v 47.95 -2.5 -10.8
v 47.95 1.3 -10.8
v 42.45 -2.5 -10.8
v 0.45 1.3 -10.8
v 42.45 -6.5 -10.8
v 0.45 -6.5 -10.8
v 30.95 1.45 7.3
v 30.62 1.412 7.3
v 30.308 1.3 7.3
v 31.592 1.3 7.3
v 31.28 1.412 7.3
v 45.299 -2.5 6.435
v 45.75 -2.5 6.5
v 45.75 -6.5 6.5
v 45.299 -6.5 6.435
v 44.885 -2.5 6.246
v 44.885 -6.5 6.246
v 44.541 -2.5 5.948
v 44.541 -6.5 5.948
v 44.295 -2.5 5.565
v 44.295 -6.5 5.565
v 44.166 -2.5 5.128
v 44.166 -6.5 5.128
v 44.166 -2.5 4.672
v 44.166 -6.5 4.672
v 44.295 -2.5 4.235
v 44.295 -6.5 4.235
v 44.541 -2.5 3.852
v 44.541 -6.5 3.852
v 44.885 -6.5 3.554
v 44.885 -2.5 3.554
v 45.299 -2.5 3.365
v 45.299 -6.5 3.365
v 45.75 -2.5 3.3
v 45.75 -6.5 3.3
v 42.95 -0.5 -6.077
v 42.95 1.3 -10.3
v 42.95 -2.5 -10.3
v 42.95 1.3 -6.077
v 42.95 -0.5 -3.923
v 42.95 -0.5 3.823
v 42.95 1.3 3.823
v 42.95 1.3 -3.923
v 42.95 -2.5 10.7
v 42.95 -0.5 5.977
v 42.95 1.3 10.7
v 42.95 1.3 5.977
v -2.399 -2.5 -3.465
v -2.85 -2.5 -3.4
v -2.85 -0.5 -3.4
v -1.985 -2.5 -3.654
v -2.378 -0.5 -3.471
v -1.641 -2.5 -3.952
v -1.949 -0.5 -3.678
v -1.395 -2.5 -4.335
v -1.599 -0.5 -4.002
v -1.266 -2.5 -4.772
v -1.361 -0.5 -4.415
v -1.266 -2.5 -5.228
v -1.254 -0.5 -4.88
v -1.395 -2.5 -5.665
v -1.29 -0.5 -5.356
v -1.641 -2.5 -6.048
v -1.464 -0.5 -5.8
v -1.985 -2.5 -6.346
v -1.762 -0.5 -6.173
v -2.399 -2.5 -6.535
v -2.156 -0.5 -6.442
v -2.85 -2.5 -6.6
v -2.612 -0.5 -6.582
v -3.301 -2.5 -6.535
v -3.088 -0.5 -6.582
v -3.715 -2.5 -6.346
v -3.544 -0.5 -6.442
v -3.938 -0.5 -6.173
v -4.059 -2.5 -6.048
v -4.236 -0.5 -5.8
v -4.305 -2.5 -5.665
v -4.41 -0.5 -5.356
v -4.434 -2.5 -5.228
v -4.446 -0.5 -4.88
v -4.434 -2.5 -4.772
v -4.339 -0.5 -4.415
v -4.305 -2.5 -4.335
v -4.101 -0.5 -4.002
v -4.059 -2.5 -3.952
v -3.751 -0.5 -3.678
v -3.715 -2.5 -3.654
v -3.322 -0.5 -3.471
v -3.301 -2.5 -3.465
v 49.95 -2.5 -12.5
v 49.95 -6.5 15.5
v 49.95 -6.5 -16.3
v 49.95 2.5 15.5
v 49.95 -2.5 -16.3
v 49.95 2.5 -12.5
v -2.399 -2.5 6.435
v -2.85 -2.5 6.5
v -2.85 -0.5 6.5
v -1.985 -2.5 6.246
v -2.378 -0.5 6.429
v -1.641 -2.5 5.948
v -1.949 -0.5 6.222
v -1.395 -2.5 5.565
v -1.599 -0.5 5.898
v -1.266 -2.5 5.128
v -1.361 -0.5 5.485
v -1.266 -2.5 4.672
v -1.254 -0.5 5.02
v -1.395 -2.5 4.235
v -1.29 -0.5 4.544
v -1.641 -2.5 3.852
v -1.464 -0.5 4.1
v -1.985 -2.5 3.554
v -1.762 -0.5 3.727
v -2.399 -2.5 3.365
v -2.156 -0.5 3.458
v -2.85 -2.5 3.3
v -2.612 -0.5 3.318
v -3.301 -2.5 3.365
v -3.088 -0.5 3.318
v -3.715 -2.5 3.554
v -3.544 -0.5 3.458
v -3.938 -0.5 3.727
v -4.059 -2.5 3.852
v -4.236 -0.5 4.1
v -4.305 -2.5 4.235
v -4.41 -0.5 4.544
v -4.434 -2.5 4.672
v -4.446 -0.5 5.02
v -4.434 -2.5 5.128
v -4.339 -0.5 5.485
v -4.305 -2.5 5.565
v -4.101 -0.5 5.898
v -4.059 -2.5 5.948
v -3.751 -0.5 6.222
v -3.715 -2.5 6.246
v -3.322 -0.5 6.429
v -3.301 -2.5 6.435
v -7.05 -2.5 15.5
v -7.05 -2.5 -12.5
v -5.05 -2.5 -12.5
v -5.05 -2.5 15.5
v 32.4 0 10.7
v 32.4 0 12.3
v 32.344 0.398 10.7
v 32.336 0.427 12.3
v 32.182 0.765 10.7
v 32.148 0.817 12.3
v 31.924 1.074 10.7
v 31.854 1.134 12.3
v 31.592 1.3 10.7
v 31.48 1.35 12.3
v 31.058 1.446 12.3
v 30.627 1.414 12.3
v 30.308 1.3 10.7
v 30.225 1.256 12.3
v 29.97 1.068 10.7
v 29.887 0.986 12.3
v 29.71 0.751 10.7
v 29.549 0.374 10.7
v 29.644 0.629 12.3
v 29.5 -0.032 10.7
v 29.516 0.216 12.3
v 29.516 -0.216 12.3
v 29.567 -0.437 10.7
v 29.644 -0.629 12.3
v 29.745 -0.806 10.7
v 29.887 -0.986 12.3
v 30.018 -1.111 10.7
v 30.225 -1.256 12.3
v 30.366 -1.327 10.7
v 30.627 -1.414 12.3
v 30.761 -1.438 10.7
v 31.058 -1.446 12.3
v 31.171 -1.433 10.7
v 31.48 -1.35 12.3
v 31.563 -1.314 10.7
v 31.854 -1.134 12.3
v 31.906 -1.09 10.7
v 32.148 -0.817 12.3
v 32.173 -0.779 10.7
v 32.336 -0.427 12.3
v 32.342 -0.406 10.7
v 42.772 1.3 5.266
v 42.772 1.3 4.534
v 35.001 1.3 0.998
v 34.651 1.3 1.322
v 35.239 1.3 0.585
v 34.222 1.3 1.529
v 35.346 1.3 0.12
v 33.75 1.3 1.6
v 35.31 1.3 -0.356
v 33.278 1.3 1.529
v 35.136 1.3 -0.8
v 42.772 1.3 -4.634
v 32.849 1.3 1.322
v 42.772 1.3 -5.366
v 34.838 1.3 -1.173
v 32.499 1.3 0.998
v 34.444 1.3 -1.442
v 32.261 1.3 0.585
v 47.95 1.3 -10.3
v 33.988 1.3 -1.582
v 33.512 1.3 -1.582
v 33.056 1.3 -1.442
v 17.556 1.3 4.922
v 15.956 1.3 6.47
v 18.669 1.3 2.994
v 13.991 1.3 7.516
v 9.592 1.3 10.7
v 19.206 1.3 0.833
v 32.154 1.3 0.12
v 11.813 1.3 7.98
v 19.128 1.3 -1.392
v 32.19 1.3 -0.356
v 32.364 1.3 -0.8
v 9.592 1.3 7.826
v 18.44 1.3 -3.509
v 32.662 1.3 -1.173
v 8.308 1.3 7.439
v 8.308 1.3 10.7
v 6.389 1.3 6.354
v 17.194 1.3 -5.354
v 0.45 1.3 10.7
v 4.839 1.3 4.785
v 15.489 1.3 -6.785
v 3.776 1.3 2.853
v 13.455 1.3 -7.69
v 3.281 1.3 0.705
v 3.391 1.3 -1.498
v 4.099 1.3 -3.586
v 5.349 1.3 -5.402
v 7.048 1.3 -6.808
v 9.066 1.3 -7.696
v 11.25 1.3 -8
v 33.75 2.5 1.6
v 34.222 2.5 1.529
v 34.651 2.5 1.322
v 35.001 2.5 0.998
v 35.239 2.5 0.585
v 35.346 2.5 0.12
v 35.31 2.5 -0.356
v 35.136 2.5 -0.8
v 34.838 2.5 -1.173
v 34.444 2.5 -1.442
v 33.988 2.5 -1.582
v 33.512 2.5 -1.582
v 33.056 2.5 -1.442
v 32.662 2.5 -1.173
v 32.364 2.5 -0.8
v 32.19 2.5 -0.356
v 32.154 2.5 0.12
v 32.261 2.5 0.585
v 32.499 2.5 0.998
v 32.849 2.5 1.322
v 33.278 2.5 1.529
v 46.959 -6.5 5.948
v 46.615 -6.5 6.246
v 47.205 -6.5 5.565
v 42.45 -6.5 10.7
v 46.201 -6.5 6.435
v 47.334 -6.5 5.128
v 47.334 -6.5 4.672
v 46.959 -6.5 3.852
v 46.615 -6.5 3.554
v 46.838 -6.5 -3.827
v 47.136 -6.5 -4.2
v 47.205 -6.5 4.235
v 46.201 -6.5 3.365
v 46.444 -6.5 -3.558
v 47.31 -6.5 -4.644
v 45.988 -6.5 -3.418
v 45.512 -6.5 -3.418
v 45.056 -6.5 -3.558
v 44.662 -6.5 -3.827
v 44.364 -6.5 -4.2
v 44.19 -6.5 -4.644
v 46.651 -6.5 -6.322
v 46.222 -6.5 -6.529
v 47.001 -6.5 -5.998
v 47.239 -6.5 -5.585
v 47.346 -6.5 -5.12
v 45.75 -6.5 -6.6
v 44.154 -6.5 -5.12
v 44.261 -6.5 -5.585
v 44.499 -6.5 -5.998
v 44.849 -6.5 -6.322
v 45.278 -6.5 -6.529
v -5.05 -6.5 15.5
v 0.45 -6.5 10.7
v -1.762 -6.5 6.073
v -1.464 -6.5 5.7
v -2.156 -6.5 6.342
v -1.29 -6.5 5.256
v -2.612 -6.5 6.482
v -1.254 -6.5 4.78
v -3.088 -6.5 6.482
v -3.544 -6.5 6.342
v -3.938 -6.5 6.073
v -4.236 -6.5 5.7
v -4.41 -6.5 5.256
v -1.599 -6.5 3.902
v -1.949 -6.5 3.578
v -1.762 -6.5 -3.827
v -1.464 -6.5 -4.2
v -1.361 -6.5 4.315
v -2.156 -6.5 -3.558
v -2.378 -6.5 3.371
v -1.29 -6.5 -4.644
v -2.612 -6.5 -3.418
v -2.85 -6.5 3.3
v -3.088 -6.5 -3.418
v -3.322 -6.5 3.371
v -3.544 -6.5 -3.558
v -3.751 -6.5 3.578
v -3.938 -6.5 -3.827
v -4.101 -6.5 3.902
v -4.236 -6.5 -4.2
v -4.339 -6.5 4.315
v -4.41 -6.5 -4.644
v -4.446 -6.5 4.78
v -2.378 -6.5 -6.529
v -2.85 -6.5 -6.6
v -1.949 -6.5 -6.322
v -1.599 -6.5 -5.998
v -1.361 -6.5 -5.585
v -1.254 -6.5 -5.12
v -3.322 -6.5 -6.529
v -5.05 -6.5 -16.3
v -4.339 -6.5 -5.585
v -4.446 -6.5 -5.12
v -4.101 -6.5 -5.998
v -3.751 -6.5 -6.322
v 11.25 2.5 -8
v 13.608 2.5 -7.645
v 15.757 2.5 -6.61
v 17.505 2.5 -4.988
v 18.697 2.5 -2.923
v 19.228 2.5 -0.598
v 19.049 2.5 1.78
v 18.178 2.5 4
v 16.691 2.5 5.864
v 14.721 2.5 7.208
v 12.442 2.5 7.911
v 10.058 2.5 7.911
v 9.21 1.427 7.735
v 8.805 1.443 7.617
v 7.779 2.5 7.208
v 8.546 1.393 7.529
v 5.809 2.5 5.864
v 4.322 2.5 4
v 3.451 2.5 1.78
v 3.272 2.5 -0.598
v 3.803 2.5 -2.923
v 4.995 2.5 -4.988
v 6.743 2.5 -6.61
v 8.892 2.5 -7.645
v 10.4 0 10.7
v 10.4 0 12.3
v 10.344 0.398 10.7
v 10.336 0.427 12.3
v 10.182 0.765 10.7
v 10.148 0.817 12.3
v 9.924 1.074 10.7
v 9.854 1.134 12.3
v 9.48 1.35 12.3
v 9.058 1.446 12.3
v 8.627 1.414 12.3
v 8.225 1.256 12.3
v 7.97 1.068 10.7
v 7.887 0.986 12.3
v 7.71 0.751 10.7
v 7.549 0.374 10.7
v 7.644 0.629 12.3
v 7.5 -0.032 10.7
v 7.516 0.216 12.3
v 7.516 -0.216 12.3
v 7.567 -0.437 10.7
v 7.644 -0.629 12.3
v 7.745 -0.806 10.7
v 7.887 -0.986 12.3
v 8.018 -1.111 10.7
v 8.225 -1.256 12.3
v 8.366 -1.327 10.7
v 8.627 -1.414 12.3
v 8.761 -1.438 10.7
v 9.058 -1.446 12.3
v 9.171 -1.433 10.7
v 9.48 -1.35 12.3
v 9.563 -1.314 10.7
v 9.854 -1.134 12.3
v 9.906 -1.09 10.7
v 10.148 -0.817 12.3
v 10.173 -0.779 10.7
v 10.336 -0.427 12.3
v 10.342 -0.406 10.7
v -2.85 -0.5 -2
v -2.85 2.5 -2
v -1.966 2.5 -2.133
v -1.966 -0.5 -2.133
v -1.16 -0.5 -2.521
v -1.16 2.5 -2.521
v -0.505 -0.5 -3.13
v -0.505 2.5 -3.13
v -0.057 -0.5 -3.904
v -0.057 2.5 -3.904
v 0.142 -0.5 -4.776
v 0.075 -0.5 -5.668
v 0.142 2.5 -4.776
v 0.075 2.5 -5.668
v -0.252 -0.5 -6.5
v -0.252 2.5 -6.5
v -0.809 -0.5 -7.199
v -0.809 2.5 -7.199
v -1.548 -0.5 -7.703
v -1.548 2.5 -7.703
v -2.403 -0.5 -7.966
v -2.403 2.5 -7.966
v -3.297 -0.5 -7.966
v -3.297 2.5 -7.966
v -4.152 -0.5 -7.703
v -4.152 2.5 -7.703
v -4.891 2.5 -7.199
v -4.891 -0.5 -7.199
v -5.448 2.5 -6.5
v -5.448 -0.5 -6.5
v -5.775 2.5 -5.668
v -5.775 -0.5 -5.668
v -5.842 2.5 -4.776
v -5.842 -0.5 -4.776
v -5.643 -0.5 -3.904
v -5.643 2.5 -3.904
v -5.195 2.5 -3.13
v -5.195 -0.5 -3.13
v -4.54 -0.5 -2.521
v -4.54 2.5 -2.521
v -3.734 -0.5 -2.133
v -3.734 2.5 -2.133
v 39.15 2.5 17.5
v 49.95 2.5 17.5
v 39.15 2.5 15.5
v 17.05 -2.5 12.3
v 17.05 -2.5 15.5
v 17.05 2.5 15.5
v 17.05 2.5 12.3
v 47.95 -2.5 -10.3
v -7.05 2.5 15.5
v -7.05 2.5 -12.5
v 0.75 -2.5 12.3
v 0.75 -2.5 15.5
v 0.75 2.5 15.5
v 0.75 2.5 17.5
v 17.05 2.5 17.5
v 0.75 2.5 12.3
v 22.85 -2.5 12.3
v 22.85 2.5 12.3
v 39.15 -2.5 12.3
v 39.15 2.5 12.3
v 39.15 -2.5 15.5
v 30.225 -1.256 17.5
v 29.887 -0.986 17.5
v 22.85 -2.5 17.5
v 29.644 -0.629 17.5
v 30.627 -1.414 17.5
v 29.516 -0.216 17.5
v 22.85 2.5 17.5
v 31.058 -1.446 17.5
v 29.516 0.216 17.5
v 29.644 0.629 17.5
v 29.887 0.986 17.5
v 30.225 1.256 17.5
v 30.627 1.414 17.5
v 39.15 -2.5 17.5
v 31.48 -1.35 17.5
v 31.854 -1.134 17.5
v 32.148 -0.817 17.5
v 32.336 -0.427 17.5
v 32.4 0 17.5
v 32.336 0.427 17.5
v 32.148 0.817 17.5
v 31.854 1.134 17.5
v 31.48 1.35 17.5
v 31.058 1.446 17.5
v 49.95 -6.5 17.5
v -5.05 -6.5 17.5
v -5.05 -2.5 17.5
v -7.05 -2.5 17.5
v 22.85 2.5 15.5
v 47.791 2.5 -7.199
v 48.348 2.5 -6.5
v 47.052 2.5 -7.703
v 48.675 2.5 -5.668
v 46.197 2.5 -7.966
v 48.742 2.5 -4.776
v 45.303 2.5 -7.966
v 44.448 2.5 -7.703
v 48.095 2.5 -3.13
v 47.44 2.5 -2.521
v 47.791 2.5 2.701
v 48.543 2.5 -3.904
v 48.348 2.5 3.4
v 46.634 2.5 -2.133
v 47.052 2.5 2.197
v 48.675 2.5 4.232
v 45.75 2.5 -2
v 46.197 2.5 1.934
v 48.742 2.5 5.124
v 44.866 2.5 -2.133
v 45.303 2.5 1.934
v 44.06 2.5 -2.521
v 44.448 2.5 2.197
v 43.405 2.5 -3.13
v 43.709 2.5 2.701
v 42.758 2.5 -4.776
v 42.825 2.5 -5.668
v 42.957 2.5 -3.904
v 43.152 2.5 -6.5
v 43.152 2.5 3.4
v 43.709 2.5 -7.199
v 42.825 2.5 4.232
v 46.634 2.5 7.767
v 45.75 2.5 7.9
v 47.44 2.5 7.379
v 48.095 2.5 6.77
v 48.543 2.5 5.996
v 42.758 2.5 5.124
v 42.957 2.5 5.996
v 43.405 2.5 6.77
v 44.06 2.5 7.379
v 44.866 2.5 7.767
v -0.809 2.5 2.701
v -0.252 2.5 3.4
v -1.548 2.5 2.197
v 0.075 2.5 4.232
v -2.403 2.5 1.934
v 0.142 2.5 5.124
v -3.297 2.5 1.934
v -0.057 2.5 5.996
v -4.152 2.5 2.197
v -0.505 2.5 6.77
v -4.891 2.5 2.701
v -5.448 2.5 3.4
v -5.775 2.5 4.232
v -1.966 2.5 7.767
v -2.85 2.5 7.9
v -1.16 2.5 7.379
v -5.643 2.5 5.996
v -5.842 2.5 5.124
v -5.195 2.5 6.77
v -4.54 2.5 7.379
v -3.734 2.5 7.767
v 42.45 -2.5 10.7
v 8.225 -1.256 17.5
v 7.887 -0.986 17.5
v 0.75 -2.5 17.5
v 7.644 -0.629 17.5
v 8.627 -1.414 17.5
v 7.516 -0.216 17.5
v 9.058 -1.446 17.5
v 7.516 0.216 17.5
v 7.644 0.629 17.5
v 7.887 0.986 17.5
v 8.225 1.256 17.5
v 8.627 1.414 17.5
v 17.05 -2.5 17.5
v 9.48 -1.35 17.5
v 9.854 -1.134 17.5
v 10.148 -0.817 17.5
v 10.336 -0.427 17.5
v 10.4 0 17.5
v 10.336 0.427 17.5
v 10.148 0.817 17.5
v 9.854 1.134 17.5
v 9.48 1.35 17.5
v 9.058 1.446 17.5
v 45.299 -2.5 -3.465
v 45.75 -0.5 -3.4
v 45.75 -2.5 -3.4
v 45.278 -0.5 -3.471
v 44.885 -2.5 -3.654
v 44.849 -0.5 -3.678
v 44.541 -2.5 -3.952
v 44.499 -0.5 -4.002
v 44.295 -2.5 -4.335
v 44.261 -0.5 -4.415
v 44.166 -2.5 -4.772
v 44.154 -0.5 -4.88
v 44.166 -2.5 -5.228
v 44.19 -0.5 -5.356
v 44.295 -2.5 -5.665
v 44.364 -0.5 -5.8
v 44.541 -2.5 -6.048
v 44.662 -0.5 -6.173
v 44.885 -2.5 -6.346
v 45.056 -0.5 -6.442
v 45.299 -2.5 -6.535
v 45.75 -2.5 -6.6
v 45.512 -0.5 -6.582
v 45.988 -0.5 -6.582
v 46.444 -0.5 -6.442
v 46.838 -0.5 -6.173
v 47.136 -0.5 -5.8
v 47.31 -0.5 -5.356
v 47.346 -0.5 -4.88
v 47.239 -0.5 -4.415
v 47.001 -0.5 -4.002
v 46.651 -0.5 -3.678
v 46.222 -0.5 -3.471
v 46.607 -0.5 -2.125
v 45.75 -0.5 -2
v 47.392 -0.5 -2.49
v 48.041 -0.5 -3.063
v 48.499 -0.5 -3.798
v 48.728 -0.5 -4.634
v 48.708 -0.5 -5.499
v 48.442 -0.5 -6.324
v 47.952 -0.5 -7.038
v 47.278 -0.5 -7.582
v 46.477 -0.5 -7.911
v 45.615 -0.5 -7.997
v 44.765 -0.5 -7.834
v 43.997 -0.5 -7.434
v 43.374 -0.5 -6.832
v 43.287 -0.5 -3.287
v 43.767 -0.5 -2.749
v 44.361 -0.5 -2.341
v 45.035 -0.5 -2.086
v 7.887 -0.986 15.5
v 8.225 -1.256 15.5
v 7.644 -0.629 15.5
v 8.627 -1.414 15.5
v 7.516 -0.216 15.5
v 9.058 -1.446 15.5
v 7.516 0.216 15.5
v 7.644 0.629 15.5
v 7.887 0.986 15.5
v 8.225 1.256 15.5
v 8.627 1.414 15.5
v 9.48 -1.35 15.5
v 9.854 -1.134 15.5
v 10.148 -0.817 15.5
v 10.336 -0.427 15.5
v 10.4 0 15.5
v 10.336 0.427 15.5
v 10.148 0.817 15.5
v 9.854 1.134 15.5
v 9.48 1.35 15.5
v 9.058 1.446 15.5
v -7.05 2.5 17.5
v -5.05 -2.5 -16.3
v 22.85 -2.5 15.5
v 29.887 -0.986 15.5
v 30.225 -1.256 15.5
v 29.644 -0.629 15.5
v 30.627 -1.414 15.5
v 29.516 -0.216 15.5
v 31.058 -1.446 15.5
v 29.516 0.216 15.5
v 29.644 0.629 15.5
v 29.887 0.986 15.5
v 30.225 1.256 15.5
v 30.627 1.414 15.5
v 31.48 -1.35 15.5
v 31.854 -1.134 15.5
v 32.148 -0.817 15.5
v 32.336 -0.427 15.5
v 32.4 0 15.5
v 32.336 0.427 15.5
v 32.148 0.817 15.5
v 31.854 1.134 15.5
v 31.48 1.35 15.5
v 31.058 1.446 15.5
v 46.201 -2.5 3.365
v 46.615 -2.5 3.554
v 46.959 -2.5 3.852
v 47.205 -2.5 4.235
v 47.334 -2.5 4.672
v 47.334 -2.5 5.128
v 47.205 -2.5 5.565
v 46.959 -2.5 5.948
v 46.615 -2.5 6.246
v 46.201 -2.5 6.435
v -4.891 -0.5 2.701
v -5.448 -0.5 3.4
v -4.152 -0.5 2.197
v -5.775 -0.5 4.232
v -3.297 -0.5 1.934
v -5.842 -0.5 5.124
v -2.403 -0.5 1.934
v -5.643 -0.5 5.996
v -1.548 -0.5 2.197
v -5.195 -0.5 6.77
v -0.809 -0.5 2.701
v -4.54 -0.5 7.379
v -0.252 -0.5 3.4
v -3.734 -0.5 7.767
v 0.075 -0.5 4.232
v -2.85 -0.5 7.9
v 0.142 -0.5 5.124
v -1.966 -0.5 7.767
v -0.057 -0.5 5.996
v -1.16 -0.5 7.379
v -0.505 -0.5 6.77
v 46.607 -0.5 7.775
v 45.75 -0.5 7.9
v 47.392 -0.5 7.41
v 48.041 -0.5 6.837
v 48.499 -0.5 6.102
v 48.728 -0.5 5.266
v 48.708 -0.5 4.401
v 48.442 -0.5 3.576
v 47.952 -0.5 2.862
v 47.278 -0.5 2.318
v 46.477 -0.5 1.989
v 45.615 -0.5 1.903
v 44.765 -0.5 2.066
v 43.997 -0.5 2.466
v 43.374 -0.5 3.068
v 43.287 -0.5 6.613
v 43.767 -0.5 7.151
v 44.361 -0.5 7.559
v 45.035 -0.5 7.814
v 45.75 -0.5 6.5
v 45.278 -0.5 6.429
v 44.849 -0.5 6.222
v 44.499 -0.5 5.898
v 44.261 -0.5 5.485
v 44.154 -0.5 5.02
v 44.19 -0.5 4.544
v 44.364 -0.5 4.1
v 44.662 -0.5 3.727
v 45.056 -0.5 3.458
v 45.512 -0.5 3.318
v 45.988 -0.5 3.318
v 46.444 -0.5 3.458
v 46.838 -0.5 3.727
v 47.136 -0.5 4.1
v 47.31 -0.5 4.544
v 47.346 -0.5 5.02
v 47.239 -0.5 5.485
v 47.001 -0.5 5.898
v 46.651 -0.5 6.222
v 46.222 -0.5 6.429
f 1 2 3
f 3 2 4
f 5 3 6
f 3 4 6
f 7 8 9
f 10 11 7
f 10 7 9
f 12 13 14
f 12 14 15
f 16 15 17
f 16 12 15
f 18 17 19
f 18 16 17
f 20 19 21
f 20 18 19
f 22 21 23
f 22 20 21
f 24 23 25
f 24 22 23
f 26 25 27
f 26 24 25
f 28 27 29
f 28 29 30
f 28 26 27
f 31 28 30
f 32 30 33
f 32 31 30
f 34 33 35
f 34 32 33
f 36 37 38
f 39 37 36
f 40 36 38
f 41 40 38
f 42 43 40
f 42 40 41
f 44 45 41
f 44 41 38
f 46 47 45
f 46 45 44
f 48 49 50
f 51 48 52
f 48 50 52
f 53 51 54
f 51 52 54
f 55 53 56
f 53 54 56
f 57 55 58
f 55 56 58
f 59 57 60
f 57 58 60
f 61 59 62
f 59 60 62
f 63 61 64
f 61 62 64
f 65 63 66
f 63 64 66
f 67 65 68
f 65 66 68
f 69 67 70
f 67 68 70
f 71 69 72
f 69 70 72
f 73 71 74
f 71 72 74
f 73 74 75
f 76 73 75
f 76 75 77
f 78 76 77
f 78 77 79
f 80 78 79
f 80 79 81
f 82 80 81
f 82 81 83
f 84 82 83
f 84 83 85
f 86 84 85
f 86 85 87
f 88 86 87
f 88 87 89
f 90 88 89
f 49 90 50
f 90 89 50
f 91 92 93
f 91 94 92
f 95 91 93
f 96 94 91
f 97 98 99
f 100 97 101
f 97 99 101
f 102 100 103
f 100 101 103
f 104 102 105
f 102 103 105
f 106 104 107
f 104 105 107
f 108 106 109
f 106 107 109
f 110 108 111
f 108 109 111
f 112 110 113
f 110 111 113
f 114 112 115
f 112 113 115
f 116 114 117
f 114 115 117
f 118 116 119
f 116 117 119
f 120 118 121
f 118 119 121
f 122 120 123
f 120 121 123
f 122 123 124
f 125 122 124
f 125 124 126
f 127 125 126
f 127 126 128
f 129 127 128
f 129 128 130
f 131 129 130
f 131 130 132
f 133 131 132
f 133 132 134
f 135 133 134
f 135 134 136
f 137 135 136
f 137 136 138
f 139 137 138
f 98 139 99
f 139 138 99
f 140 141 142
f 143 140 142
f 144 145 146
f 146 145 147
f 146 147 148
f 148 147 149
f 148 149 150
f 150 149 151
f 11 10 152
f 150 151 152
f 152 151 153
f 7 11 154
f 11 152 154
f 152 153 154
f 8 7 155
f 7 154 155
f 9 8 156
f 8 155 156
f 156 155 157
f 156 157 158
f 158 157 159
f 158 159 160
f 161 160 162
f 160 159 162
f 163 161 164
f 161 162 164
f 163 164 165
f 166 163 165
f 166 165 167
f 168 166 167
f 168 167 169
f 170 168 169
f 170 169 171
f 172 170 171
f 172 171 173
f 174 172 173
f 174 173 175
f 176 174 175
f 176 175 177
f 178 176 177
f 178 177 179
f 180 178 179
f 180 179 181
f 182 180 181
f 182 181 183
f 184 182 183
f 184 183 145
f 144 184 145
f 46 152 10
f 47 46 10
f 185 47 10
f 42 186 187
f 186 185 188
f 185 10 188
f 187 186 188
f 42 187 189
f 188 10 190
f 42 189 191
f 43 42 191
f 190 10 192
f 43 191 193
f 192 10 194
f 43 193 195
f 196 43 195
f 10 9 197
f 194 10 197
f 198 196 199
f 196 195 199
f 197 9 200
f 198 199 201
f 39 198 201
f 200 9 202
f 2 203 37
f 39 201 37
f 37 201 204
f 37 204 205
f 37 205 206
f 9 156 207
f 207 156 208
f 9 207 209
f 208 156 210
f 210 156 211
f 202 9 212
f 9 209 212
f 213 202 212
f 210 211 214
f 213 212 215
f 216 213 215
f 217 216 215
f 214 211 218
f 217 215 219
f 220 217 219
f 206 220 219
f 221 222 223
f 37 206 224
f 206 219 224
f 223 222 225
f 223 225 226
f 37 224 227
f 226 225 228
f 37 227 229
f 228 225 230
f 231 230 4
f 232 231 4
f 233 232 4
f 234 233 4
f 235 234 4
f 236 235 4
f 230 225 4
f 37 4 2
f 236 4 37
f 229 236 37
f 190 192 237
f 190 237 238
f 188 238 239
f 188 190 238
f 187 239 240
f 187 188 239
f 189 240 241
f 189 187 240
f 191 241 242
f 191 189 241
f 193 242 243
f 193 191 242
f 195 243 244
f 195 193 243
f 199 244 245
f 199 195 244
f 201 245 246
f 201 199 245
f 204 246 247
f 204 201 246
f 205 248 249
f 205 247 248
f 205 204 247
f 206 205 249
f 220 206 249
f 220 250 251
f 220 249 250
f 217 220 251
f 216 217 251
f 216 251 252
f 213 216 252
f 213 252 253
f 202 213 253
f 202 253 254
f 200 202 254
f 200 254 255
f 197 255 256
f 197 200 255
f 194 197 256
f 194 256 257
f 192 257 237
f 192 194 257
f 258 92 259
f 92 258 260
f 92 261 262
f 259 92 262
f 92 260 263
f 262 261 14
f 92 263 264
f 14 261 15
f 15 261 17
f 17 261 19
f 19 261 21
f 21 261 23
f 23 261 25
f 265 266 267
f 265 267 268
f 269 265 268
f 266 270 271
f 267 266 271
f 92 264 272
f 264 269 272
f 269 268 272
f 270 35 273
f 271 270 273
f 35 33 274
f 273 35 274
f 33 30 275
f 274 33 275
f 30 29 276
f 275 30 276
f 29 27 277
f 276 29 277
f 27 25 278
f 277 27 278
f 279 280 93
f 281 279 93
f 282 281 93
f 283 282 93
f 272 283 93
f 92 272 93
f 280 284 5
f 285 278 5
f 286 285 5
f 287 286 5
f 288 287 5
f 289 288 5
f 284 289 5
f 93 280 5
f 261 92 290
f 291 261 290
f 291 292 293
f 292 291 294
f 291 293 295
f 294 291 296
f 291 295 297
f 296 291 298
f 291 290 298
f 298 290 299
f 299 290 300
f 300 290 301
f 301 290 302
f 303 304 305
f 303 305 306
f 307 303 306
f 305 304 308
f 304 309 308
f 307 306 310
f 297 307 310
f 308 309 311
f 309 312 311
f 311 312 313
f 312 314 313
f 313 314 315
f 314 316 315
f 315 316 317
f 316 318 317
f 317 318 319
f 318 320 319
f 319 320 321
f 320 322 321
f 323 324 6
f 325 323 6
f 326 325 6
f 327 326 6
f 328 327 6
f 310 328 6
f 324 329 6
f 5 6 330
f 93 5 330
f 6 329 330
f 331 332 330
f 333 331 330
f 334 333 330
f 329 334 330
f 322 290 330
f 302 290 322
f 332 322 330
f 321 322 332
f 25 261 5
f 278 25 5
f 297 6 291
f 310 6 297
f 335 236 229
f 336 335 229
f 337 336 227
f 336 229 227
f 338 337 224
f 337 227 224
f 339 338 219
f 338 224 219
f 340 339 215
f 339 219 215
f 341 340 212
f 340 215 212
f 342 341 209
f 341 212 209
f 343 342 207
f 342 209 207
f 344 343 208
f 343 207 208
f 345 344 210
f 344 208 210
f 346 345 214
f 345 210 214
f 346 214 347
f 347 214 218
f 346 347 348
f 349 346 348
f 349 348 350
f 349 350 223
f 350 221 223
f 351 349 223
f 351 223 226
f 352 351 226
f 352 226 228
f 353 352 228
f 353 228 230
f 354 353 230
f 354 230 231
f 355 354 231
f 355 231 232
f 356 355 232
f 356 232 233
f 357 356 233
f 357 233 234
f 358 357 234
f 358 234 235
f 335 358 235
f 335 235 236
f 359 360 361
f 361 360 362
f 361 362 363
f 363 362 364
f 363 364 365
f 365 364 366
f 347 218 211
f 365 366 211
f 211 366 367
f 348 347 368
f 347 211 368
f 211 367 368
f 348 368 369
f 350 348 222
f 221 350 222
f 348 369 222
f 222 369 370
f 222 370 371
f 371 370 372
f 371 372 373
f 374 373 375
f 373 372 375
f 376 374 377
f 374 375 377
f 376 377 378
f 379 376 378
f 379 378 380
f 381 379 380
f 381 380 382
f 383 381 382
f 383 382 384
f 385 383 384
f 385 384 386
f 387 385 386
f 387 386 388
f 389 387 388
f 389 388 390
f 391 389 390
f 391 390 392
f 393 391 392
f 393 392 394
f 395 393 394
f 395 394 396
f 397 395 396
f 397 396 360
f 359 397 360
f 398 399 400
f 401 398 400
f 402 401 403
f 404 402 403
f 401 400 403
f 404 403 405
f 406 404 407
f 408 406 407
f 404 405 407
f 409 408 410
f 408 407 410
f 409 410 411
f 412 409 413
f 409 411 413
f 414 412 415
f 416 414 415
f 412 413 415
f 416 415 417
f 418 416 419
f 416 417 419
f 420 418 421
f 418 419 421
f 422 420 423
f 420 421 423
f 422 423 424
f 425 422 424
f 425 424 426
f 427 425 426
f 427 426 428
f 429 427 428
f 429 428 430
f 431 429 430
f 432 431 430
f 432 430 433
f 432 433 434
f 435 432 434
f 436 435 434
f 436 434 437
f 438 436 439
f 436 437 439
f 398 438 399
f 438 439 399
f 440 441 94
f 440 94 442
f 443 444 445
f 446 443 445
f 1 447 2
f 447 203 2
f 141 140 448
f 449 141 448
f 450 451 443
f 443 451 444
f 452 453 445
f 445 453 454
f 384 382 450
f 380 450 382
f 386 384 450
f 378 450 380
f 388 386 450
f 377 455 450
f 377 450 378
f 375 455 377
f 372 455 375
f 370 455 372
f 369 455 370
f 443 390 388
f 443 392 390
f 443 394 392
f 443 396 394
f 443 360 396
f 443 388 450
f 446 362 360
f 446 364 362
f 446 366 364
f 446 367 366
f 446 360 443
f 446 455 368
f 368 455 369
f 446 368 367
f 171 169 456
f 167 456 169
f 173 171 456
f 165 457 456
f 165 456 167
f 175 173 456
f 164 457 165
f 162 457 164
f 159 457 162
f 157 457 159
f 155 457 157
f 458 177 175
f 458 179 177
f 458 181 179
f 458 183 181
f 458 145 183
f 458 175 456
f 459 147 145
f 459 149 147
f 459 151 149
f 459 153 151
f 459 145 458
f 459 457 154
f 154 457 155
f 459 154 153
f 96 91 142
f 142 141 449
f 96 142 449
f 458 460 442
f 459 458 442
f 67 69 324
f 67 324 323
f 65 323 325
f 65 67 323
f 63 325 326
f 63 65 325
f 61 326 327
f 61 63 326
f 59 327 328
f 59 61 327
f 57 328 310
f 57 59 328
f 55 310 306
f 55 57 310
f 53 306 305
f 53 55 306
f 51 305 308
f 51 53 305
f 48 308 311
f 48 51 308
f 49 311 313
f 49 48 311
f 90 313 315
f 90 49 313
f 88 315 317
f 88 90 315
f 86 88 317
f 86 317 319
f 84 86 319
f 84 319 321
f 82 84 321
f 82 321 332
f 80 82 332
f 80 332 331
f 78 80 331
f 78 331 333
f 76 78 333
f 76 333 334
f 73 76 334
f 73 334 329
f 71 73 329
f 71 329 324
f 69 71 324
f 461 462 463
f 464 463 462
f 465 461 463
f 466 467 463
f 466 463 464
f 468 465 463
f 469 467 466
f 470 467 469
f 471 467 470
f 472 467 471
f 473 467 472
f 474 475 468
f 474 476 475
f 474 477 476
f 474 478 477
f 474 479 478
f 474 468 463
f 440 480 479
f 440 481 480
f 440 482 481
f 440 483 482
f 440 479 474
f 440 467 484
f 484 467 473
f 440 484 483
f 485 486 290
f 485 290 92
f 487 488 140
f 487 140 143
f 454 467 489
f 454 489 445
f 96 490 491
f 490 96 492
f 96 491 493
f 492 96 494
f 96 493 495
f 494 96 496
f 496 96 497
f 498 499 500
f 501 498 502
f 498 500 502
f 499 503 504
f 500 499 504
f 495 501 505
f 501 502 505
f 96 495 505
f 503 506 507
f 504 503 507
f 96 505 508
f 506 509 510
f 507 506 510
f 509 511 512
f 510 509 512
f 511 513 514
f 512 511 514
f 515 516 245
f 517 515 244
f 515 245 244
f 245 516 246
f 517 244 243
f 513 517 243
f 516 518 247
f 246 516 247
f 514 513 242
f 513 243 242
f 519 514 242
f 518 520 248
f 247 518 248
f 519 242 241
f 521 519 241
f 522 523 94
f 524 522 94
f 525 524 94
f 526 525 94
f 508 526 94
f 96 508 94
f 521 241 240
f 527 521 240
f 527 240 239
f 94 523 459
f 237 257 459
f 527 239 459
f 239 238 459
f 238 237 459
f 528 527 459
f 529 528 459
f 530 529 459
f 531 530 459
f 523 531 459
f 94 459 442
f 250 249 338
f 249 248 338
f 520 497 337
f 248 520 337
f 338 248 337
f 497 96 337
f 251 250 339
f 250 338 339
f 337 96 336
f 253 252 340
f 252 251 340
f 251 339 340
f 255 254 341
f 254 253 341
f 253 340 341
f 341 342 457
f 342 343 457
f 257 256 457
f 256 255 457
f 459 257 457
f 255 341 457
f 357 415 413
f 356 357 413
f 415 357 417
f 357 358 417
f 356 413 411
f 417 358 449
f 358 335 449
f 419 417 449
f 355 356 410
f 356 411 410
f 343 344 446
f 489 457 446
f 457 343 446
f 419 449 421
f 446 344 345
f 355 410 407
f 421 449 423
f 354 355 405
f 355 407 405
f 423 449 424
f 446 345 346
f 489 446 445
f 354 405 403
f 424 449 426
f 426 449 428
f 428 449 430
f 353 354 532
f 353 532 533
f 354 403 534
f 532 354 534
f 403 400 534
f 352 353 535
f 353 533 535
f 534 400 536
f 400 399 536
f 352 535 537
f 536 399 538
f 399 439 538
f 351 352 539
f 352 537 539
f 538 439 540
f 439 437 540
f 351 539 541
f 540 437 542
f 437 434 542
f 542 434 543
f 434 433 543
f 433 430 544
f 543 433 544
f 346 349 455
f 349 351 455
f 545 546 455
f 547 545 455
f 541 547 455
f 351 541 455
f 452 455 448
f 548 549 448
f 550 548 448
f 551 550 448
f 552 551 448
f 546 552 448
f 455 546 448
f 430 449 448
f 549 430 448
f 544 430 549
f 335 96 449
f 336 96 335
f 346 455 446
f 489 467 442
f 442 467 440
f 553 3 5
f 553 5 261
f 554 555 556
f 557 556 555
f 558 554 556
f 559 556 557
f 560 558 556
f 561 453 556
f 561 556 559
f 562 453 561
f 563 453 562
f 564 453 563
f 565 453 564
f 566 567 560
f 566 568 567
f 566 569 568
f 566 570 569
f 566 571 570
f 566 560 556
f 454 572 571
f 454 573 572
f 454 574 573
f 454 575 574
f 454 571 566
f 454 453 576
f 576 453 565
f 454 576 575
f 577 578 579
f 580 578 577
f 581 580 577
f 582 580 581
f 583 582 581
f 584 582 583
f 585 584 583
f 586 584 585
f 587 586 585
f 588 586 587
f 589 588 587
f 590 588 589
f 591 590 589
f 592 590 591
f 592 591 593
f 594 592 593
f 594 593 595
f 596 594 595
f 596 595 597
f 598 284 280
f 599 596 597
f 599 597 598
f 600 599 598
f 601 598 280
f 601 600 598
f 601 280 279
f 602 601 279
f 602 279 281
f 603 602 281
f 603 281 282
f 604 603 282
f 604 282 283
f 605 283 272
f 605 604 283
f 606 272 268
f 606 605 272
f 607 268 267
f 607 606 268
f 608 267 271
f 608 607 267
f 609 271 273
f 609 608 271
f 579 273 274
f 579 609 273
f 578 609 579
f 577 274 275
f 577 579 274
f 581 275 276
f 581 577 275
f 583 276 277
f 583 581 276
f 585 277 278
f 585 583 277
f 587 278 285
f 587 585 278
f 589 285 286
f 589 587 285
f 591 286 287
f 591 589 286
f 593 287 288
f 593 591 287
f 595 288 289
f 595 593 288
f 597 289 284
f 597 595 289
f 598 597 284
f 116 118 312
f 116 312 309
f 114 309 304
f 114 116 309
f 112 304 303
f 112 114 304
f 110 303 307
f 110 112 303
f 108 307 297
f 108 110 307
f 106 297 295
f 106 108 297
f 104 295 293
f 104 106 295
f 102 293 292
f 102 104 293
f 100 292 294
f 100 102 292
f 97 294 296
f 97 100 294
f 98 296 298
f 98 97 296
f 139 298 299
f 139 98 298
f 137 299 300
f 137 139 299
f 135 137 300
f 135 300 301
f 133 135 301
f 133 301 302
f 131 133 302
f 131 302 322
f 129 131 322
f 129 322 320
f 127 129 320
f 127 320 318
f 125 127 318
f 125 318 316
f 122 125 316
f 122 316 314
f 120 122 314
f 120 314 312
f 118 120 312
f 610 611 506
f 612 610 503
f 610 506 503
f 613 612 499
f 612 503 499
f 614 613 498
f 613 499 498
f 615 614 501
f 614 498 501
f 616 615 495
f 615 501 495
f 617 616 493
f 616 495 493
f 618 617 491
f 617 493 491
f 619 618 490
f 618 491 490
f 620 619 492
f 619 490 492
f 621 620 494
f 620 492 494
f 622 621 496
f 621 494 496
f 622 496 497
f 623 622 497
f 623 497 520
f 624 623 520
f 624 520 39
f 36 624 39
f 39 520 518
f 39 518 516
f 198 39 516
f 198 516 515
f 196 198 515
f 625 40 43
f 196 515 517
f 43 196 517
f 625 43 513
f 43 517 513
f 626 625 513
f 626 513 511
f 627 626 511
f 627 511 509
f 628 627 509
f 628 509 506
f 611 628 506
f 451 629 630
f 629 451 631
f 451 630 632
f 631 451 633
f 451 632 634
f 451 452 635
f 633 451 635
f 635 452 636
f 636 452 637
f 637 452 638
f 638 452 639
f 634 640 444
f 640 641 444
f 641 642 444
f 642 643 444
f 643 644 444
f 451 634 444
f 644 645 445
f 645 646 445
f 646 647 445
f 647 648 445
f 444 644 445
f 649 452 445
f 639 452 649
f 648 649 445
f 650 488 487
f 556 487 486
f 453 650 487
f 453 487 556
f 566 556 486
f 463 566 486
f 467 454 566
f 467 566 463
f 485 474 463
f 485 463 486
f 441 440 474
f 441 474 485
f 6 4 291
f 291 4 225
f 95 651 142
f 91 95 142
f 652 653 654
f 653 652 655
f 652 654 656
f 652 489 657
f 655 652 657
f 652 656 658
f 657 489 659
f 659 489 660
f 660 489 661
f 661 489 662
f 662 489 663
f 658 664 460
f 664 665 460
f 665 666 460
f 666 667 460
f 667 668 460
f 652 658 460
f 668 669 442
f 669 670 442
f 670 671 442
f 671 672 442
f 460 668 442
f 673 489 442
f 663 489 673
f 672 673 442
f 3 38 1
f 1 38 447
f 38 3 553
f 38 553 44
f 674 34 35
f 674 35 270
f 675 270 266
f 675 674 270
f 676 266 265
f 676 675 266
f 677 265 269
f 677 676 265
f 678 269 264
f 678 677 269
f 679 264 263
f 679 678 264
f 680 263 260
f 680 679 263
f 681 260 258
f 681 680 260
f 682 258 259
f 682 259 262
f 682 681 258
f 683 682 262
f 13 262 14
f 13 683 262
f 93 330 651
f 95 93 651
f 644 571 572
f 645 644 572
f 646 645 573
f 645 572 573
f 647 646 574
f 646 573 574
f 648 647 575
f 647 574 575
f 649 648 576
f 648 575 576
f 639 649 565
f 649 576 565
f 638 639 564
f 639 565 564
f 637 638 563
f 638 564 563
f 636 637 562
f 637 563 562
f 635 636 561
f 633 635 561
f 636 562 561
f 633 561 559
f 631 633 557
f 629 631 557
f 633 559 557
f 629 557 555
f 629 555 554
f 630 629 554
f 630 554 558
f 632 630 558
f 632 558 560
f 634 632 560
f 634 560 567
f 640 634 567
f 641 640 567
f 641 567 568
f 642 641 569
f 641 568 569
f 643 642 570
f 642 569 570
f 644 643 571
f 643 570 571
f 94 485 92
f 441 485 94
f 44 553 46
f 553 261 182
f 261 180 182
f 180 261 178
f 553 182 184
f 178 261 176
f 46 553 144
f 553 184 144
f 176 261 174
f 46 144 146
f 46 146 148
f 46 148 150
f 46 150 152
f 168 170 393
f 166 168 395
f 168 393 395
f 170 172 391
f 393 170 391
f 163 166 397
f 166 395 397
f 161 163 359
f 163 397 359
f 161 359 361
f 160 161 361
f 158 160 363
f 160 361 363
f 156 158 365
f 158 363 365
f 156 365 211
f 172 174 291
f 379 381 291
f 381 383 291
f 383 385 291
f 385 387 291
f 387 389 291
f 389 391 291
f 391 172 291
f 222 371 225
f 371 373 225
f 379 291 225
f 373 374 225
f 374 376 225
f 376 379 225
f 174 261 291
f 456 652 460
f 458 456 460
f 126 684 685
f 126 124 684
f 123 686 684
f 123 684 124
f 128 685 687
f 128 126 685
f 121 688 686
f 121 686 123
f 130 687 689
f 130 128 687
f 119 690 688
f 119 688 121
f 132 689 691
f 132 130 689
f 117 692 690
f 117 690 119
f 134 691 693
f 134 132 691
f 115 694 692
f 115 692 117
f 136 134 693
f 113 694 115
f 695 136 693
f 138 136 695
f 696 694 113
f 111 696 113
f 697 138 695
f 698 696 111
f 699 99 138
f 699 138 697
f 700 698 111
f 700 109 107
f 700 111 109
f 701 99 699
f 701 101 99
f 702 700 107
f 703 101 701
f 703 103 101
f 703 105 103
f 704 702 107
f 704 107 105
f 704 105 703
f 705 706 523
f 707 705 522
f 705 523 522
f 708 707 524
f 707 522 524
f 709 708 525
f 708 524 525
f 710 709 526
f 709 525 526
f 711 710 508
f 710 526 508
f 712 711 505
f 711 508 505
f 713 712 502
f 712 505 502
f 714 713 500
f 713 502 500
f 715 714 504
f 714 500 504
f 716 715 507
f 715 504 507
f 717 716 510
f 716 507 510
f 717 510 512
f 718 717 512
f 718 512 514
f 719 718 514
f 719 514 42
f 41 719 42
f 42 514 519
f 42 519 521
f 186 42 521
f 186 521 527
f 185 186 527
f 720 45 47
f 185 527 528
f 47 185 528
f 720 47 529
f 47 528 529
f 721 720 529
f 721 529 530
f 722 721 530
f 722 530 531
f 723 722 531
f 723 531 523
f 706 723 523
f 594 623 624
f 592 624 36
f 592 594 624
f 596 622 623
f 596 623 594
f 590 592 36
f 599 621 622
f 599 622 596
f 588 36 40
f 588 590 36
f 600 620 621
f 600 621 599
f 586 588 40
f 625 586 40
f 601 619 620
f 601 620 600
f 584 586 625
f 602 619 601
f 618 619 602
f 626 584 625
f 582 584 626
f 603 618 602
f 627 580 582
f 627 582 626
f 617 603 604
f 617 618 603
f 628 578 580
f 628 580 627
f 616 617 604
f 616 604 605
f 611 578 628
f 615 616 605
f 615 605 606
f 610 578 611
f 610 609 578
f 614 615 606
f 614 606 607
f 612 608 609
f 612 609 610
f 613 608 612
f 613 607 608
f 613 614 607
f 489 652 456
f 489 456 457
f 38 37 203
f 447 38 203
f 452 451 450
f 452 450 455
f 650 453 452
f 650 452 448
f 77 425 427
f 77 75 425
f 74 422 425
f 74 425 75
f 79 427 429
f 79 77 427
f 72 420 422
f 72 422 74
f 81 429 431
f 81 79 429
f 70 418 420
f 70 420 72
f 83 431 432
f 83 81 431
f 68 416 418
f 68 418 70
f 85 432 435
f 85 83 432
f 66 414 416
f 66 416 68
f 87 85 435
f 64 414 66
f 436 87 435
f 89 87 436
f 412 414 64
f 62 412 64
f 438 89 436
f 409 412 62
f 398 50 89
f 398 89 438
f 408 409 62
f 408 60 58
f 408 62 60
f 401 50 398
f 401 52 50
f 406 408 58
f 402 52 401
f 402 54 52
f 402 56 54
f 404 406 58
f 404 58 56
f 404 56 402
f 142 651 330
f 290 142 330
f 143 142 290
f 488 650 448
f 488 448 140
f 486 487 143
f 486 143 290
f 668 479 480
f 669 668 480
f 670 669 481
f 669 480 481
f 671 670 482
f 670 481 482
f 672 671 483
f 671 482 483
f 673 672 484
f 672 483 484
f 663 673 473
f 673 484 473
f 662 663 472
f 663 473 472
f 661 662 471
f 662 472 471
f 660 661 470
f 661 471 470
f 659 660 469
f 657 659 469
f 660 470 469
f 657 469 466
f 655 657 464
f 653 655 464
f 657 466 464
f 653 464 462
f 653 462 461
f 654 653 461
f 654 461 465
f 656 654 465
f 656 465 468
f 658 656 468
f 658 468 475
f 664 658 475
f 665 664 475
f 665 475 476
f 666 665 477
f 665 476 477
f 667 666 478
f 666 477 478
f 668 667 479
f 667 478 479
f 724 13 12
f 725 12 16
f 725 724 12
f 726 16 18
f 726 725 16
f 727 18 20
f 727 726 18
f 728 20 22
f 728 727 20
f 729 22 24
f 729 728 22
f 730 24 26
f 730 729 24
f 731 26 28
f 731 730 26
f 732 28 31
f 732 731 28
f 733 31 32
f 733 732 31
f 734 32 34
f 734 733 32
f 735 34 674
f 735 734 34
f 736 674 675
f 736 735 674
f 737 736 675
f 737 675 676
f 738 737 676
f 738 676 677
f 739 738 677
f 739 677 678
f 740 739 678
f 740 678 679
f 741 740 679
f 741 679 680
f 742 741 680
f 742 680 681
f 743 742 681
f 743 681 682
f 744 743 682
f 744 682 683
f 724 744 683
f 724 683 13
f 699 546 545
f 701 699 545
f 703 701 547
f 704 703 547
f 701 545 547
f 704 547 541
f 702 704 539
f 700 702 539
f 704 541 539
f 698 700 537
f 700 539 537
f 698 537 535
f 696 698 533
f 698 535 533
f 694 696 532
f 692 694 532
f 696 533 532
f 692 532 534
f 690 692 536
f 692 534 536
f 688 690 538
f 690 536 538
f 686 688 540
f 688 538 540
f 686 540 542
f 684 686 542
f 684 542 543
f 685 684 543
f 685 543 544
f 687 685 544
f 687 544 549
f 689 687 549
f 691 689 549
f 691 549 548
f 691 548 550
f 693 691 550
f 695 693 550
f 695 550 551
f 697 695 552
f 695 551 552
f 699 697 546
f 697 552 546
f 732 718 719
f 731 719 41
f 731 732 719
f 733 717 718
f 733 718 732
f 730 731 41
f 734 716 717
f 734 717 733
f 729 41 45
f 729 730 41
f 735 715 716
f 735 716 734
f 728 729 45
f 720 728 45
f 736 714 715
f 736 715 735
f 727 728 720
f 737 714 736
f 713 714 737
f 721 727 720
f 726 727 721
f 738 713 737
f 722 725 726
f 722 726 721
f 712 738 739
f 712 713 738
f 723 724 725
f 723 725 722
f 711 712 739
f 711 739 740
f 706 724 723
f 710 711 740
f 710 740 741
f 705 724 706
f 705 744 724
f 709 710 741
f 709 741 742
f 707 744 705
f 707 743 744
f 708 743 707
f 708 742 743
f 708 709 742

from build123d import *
from build123d.topology import SkipClean

# Parameters (mm, degrees)
SKETCH1_W                = 50
SKETCH1_H                = 25
SKETCH1_R                = 1.3
SKETCH1_R_2              = 4.5
BOSS_EXTRUDE1_DEPTH      = 2.5
SKETCH2_W                = 50
SKETCH2_H                = 12
BOSS_EXTRUDE2_DEPTH      = 3
SKETCH3_W                = 50
SKETCH3_H                = 28
BOSS_EXTRUDE3_DEPTH      = 3
SKETCH4_R                = 1.3
CUT_EXTRUDE1_DEPTH       = 34.018933962
SKETCH5_W                = 53
SKETCH5_H                = 32.5
SKETCH5_R                = 1.6
SKETCH5_W_2              = 42
SKETCH5_H_2              = 21.5
BOSS_EXTRUDE4_DEPTH      = 4
SKETCH7_R                = 8
CUT_EXTRUDE2_DEPTH       = 5
SKETCH8_W                = 24.55
SKETCH8_H                = 21.5
CUT_EXTRUDE3_DEPTH       = 3.8
BOSS_EXTRUDE6_DEPTH      = 22.95
BOSS_EXTRUDE7_DEPTH      = 2
CUT_EXTRUDE4_START       = -1.2
SKETCH11_R               = 1.6
CUT_EXTRUDE4_DEPTH       = 1.2
SKETCH12_W               = 7
SKETCH12_H               = 21
SKETCH12_R               = 1.6
BOSS_EXTRUDE8_DEPTH      = 7.8
CUT_EXTRUDE5_DEPTH       = 55.054972019
CUT_EXTRUDE5_DEPTH_BACK  = 55.054972019
SKETCH13_W               = 0.7
SKETCH13_H               = 5
SKETCH13_H_2             = 4
CUT_EXTRUDE6_DEPTH       = 78.713850117
CUT_EXTRUDE6_DEPTH_BACK  = 78.713850117
SKETCH14_W               = 28
SKETCH14_H               = 10
SKETCH16_R               = 3
CUT_EXTRUDE8_DEPTH       = 3
SKETCH15_R               = 1.6
CUT_EXTRUDE9_DEPTH       = 5
SKETCH17_W               = 16.3
SKETCH17_H               = 5
CUT_EXTRUDE10_DEPTH      = 3.2
SKETCH18_R               = 1.45
CUT_EXTRUDE11_DEPTH      = 5
CUT_EXTRUDE12_DEPTH      = 54.307527611
CUT_EXTRUDE12_DEPTH_BACK = 54.307527611
SKETCH19_R               = 1.6
CUT_EXTRUDE14_DEPTH      = 60.569224437
CUT_EXTRUDE14_DEPTH_BACK = 60.569224437
SKETCH20_W               = 17.95
SKETCH20_H               = 5
BOSS_EXTRUDE11_START     = 2
SKETCH21_W               = 16.3
SKETCH21_H               = 5
SKETCH21_R               = 1.45
BOSS_EXTRUDE11_DEPTH     = 2


with BuildPart() as part:
    # Sketch1 → Boss-Extrude1 (new, symmetric)
    with BuildSketch(Plane(origin=(0, 0, 0), x_dir=(1, 0, 0), z_dir=(0, 1, 0))):
        Rectangle(SKETCH1_W, SKETCH1_H)
        with Locations(Location((-11.25, 0, 0), (0, 0, 270))):
            Circle(SKETCH1_R, mode=Mode.SUBTRACT)
        with Locations(Location((11.25, 0, 0), (0, 0, 270))):
            Circle(SKETCH1_R_2, mode=Mode.SUBTRACT)
    extrude(amount=BOSS_EXTRUDE1_DEPTH, both=True)

    # Sketch2 → Boss-Extrude2 (add)
    with BuildSketch(Plane.XY.offset(12.5)):
        with Locations((0, 3.5)):
            Rectangle(SKETCH2_W, SKETCH2_H)
    extrude(amount=BOSS_EXTRUDE2_DEPTH)

    # Sketch3 → Boss-Extrude3 (add)
    with BuildSketch(Plane(origin=(0, 9.5, 0), x_dir=(1, 0, 0), z_dir=(0, 1, 0))):
        with Locations((0, -1.5)):
            Rectangle(SKETCH3_W, SKETCH3_H)
    extrude(amount=BOSS_EXTRUDE3_DEPTH)

    # Sketch4 → Cut-Extrude1 (cut, through all)
    with BuildSketch(Plane(origin=(0, 12.5, 0), x_dir=(1, 0, 0), z_dir=(0, 1, 0))):
        with Locations(Location((11.25, 0, 0), (0, 0, 270))):
            Circle(SKETCH4_R)
        with Locations(Location((-11.25, 0, 0), (0, 0, 270))):
            Circle(SKETCH4_R)
    extrude(amount=-CUT_EXTRUDE1_DEPTH, mode=Mode.SUBTRACT)

    # Sketch5 → Boss-Extrude4 (add)
    with BuildSketch(Plane.XZ.offset(2.5)):
        with Locations((21.45, -0.05)):
            Rectangle(SKETCH5_W, SKETCH5_H)
        with Locations(Location((45.75, -5, 0), (0, 0, 270))):
            Circle(SKETCH5_R, mode=Mode.SUBTRACT)
        with Locations(Location((45.75, 4.9, 0), (0, 0, 270))):
            Circle(SKETCH5_R, mode=Mode.SUBTRACT)
        with Locations(Location((-2.85, 4.9, 0), (0, 0, 270))):
            Circle(SKETCH5_R, mode=Mode.SUBTRACT)
        with Locations(Location((-2.85, -5, 0), (0, 0, 270))):
            Circle(SKETCH5_R, mode=Mode.SUBTRACT)
        with Locations((21.45, -0.05)):
            Rectangle(SKETCH5_W_2, SKETCH5_H_2, mode=Mode.SUBTRACT)
    extrude(amount=BOSS_EXTRUDE4_DEPTH)

    # Sketch7 → Cut-Extrude2 (cut)
    with BuildSketch(Plane.XZ.offset(2.5)):
        with Locations(Location((11.25, 0, 0), (0, 0, 270))):
            Circle(SKETCH7_R)
    extrude(amount=-CUT_EXTRUDE2_DEPTH, mode=Mode.SUBTRACT)

    # Sketch8 → Cut-Extrude3 (cut)
    with BuildSketch(Plane.XZ.offset(2.5)):
        with Locations((12.725, -0.05)):
            Rectangle(SKETCH8_W, SKETCH8_H)
    extrude(amount=-CUT_EXTRUDE3_DEPTH, mode=Mode.SUBTRACT)

    # Sketch9 → Boss-Extrude6 (add)
    with BuildSketch(Plane(origin=(25, 0, 0), x_dir=(0, 0, -1), z_dir=(1, 0, 0))):
        Polygon((12.5, 2.5), (-16.2, 2.5), (-16.2, -2.5), (-10.7, -2.5), (-10.7, 1.3), (10.8, 1.3), (10.8, -2.5), (12.5, -2.5), align=None)
    extrude(amount=BOSS_EXTRUDE6_DEPTH)

    # Sketch10 → Boss-Extrude7 (add)
    with BuildSketch(Plane(origin=(47.95, 0, 0), x_dir=(0, 0, -1), z_dir=(1, 0, 0))):
        Polygon((16.3, -2.5), (12.5, -2.5), (12.5, 2.5), (-16.2, 2.5), (-16.2, -6.5), (16.3, -6.5), align=None)
    extrude(amount=BOSS_EXTRUDE7_DEPTH)

    # Sketch11 → Cut-Extrude4 (cut)
    with BuildSketch(Plane.XZ.offset(-1.3).offset(CUT_EXTRUDE4_START)):
        with Locations(Location((-2.85, 4.9, 0), (0, 0, 270))):
            Circle(SKETCH11_R)
        with Locations(Location((-2.85, -5, 0), (0, 0, 270))):
            Circle(SKETCH11_R)
        with Locations(Location((45.75, 4.9, 0), (0, 0, 270))):
            Circle(SKETCH11_R)
        with Locations(Location((45.75, -5, 0), (0, 0, 270))):
            Circle(SKETCH11_R)
    extrude(amount=CUT_EXTRUDE4_DEPTH, mode=Mode.SUBTRACT)

    # Sketch12 → Boss-Extrude8 (add)
    with BuildSketch(Plane.XZ.offset(-1.3)):
        with Locations((46.45, 0.2)):
            Rectangle(SKETCH12_W, SKETCH12_H)
        with Locations(Location((45.75, 4.9, 0), (0, 0, 90))):
            Circle(SKETCH12_R, mode=Mode.SUBTRACT)
        with Locations(Location((45.75, -5, 0), (0, 0, 90))):
            Circle(SKETCH12_R, mode=Mode.SUBTRACT)
    extrude(amount=BOSS_EXTRUDE8_DEPTH)

    # Sketch13 → Cut-Extrude5 (cut, two sides: drawn at the far end of the back side and taken through both)
    with BuildSketch(Plane.ZY.offset(-25).offset(-CUT_EXTRUDE5_DEPTH_BACK)):
        with Locations((15.85, 0)):
            Rectangle(SKETCH13_W, SKETCH13_H)
        with Locations((15.85, -4.5)):
            Rectangle(SKETCH13_W, SKETCH13_H_2)
    extrude(amount=CUT_EXTRUDE5_DEPTH + CUT_EXTRUDE5_DEPTH_BACK, mode=Mode.SUBTRACT)

    # Sketch14 → Cut-Extrude6 (cut, two sides: drawn at the far end of the back side and taken through both)
    with BuildSketch(Plane.ZY.offset(25).offset(-CUT_EXTRUDE6_DEPTH_BACK)):
        with Locations((1.5, 7.5)):
            Rectangle(SKETCH14_W, SKETCH14_H)
    extrude(amount=CUT_EXTRUDE6_DEPTH + CUT_EXTRUDE6_DEPTH_BACK, mode=Mode.SUBTRACT)

    # Sketch16 → Cut-Extrude8 (cut)
    with BuildSketch(Plane(origin=(0, 2.5, 0), x_dir=(1, 0, 0), z_dir=(0, 1, 0))):
        with Locations(Location((-2.85, 5, 0), (0, 0, 270))):
            Circle(SKETCH16_R)
        with Locations(Location((-2.85, -4.9, 0), (0, 0, 270))):
            Circle(SKETCH16_R)
        with Locations(Location((45.75, 5, 0), (0, 0, 270))):
            Circle(SKETCH16_R)
        with Locations(Location((45.75, -4.9, 0), (0, 0, 270))):
            Circle(SKETCH16_R)
    extrude(amount=-CUT_EXTRUDE8_DEPTH, mode=Mode.SUBTRACT)

    # Sketch15 → Cut-Extrude9 (cut)
    with SkipClean():  # the faces are left unmerged after this step: merging them gives an invalid solid
        with BuildSketch(Plane(origin=(0, 2.5, 0), x_dir=(1, 0, 0), z_dir=(0, 1, 0))):
            with Locations(Location((-2.85, 5, 0), (0, 0, 270))):
                Circle(SKETCH15_R)
            with Locations(Location((-2.85, -4.9, 0), (0, 0, 270))):
                Circle(SKETCH15_R)
        extrude(amount=-CUT_EXTRUDE9_DEPTH, mode=Mode.SUBTRACT)

    # Sketch17 → Cut-Extrude10 (cut)
    with SkipClean():  # the faces are left unmerged after this step: merging them gives an invalid solid
        with BuildSketch(Plane.XY.offset(15.5)):
            with Locations((8.9, 0)):
                Rectangle(SKETCH17_W, SKETCH17_H)
            with Locations((31, 0)):
                Rectangle(SKETCH17_W, SKETCH17_H)
        extrude(amount=-CUT_EXTRUDE10_DEPTH, mode=Mode.SUBTRACT)

    # Sketch18 → Cut-Extrude11 (cut)
    with SkipClean():  # the faces are left unmerged after this step: merging them gives an invalid solid
        with BuildSketch(Plane.XY.offset(12.3)):
            with Locations((8.95, 0)):
                Circle(SKETCH18_R)
            with Locations((30.95, 0)):
                Circle(SKETCH18_R)
        extrude(amount=-CUT_EXTRUDE11_DEPTH, mode=Mode.SUBTRACT)

    # Sketch19 → Cut-Extrude12 (cut, two sides: drawn at the far end of the back side and taken through both)
    with SkipClean():  # the faces are left unmerged after this step: merging them gives an invalid solid
        with BuildSketch(Plane(origin=(0, 2.5, 0), x_dir=(1, 0, 0), z_dir=(0, 1, 0)).offset(-CUT_EXTRUDE12_DEPTH_BACK)):
            with Locations(Location((33.75, 0, 0), (0, 0, 270))):
                Circle(SKETCH19_R)
        extrude(amount=CUT_EXTRUDE12_DEPTH + CUT_EXTRUDE12_DEPTH_BACK, mode=Mode.SUBTRACT)

    # Sketch20 → Cut-Extrude14 (cut, two sides: drawn at the far end of the back side and taken through both)
    with SkipClean():  # the faces are left unmerged after this step: merging them gives an invalid solid
        with BuildSketch(Plane.XY.offset(15.5).offset(-CUT_EXTRUDE14_DEPTH_BACK)):
            with Locations((-16.025, 0)):
                Rectangle(SKETCH20_W, SKETCH20_H)
        extrude(amount=CUT_EXTRUDE14_DEPTH + CUT_EXTRUDE14_DEPTH_BACK, mode=Mode.SUBTRACT)

    # Sketch21 → Boss-Extrude11 (add)
    # profile 1 of 3: a face of its own
    with SkipClean():  # the faces are left unmerged after this step: merging them gives an invalid solid
        with BuildSketch(Plane.XY.offset(15.5).offset(BOSS_EXTRUDE11_START)):
            with Locations((8.9, 0)):
                Rectangle(SKETCH21_W, SKETCH21_H)
            with Locations((8.95, 0)):
                Circle(SKETCH21_R, mode=Mode.SUBTRACT)
        # profile 2 of 3: a face of its own
        with BuildSketch(Plane.XY.offset(15.5).offset(BOSS_EXTRUDE11_START)):
            Polygon((0.75, -2.5), (0.75, 2.5), (-7.05, 2.5), (-7.05, -2.5), (-5.05, -2.5), (-5.05, -6.5), (49.95, -6.5), (49.95, 2.5), (39.15, 2.5), (39.15, -2.5), (22.85, -2.5), (22.85, 2.5), (17.05, 2.5), (17.05, -2.5), align=None)
        # profile 3 of 3: a face of its own
        with BuildSketch(Plane.XY.offset(15.5).offset(BOSS_EXTRUDE11_START)):
            with Locations((31, 0)):
                Rectangle(SKETCH21_W, SKETCH21_H)
            with Locations((30.95, 0)):
                Circle(SKETCH21_R, mode=Mode.SUBTRACT)
        extrude(amount=-BOSS_EXTRUDE11_DEPTH)


solid = part.part
